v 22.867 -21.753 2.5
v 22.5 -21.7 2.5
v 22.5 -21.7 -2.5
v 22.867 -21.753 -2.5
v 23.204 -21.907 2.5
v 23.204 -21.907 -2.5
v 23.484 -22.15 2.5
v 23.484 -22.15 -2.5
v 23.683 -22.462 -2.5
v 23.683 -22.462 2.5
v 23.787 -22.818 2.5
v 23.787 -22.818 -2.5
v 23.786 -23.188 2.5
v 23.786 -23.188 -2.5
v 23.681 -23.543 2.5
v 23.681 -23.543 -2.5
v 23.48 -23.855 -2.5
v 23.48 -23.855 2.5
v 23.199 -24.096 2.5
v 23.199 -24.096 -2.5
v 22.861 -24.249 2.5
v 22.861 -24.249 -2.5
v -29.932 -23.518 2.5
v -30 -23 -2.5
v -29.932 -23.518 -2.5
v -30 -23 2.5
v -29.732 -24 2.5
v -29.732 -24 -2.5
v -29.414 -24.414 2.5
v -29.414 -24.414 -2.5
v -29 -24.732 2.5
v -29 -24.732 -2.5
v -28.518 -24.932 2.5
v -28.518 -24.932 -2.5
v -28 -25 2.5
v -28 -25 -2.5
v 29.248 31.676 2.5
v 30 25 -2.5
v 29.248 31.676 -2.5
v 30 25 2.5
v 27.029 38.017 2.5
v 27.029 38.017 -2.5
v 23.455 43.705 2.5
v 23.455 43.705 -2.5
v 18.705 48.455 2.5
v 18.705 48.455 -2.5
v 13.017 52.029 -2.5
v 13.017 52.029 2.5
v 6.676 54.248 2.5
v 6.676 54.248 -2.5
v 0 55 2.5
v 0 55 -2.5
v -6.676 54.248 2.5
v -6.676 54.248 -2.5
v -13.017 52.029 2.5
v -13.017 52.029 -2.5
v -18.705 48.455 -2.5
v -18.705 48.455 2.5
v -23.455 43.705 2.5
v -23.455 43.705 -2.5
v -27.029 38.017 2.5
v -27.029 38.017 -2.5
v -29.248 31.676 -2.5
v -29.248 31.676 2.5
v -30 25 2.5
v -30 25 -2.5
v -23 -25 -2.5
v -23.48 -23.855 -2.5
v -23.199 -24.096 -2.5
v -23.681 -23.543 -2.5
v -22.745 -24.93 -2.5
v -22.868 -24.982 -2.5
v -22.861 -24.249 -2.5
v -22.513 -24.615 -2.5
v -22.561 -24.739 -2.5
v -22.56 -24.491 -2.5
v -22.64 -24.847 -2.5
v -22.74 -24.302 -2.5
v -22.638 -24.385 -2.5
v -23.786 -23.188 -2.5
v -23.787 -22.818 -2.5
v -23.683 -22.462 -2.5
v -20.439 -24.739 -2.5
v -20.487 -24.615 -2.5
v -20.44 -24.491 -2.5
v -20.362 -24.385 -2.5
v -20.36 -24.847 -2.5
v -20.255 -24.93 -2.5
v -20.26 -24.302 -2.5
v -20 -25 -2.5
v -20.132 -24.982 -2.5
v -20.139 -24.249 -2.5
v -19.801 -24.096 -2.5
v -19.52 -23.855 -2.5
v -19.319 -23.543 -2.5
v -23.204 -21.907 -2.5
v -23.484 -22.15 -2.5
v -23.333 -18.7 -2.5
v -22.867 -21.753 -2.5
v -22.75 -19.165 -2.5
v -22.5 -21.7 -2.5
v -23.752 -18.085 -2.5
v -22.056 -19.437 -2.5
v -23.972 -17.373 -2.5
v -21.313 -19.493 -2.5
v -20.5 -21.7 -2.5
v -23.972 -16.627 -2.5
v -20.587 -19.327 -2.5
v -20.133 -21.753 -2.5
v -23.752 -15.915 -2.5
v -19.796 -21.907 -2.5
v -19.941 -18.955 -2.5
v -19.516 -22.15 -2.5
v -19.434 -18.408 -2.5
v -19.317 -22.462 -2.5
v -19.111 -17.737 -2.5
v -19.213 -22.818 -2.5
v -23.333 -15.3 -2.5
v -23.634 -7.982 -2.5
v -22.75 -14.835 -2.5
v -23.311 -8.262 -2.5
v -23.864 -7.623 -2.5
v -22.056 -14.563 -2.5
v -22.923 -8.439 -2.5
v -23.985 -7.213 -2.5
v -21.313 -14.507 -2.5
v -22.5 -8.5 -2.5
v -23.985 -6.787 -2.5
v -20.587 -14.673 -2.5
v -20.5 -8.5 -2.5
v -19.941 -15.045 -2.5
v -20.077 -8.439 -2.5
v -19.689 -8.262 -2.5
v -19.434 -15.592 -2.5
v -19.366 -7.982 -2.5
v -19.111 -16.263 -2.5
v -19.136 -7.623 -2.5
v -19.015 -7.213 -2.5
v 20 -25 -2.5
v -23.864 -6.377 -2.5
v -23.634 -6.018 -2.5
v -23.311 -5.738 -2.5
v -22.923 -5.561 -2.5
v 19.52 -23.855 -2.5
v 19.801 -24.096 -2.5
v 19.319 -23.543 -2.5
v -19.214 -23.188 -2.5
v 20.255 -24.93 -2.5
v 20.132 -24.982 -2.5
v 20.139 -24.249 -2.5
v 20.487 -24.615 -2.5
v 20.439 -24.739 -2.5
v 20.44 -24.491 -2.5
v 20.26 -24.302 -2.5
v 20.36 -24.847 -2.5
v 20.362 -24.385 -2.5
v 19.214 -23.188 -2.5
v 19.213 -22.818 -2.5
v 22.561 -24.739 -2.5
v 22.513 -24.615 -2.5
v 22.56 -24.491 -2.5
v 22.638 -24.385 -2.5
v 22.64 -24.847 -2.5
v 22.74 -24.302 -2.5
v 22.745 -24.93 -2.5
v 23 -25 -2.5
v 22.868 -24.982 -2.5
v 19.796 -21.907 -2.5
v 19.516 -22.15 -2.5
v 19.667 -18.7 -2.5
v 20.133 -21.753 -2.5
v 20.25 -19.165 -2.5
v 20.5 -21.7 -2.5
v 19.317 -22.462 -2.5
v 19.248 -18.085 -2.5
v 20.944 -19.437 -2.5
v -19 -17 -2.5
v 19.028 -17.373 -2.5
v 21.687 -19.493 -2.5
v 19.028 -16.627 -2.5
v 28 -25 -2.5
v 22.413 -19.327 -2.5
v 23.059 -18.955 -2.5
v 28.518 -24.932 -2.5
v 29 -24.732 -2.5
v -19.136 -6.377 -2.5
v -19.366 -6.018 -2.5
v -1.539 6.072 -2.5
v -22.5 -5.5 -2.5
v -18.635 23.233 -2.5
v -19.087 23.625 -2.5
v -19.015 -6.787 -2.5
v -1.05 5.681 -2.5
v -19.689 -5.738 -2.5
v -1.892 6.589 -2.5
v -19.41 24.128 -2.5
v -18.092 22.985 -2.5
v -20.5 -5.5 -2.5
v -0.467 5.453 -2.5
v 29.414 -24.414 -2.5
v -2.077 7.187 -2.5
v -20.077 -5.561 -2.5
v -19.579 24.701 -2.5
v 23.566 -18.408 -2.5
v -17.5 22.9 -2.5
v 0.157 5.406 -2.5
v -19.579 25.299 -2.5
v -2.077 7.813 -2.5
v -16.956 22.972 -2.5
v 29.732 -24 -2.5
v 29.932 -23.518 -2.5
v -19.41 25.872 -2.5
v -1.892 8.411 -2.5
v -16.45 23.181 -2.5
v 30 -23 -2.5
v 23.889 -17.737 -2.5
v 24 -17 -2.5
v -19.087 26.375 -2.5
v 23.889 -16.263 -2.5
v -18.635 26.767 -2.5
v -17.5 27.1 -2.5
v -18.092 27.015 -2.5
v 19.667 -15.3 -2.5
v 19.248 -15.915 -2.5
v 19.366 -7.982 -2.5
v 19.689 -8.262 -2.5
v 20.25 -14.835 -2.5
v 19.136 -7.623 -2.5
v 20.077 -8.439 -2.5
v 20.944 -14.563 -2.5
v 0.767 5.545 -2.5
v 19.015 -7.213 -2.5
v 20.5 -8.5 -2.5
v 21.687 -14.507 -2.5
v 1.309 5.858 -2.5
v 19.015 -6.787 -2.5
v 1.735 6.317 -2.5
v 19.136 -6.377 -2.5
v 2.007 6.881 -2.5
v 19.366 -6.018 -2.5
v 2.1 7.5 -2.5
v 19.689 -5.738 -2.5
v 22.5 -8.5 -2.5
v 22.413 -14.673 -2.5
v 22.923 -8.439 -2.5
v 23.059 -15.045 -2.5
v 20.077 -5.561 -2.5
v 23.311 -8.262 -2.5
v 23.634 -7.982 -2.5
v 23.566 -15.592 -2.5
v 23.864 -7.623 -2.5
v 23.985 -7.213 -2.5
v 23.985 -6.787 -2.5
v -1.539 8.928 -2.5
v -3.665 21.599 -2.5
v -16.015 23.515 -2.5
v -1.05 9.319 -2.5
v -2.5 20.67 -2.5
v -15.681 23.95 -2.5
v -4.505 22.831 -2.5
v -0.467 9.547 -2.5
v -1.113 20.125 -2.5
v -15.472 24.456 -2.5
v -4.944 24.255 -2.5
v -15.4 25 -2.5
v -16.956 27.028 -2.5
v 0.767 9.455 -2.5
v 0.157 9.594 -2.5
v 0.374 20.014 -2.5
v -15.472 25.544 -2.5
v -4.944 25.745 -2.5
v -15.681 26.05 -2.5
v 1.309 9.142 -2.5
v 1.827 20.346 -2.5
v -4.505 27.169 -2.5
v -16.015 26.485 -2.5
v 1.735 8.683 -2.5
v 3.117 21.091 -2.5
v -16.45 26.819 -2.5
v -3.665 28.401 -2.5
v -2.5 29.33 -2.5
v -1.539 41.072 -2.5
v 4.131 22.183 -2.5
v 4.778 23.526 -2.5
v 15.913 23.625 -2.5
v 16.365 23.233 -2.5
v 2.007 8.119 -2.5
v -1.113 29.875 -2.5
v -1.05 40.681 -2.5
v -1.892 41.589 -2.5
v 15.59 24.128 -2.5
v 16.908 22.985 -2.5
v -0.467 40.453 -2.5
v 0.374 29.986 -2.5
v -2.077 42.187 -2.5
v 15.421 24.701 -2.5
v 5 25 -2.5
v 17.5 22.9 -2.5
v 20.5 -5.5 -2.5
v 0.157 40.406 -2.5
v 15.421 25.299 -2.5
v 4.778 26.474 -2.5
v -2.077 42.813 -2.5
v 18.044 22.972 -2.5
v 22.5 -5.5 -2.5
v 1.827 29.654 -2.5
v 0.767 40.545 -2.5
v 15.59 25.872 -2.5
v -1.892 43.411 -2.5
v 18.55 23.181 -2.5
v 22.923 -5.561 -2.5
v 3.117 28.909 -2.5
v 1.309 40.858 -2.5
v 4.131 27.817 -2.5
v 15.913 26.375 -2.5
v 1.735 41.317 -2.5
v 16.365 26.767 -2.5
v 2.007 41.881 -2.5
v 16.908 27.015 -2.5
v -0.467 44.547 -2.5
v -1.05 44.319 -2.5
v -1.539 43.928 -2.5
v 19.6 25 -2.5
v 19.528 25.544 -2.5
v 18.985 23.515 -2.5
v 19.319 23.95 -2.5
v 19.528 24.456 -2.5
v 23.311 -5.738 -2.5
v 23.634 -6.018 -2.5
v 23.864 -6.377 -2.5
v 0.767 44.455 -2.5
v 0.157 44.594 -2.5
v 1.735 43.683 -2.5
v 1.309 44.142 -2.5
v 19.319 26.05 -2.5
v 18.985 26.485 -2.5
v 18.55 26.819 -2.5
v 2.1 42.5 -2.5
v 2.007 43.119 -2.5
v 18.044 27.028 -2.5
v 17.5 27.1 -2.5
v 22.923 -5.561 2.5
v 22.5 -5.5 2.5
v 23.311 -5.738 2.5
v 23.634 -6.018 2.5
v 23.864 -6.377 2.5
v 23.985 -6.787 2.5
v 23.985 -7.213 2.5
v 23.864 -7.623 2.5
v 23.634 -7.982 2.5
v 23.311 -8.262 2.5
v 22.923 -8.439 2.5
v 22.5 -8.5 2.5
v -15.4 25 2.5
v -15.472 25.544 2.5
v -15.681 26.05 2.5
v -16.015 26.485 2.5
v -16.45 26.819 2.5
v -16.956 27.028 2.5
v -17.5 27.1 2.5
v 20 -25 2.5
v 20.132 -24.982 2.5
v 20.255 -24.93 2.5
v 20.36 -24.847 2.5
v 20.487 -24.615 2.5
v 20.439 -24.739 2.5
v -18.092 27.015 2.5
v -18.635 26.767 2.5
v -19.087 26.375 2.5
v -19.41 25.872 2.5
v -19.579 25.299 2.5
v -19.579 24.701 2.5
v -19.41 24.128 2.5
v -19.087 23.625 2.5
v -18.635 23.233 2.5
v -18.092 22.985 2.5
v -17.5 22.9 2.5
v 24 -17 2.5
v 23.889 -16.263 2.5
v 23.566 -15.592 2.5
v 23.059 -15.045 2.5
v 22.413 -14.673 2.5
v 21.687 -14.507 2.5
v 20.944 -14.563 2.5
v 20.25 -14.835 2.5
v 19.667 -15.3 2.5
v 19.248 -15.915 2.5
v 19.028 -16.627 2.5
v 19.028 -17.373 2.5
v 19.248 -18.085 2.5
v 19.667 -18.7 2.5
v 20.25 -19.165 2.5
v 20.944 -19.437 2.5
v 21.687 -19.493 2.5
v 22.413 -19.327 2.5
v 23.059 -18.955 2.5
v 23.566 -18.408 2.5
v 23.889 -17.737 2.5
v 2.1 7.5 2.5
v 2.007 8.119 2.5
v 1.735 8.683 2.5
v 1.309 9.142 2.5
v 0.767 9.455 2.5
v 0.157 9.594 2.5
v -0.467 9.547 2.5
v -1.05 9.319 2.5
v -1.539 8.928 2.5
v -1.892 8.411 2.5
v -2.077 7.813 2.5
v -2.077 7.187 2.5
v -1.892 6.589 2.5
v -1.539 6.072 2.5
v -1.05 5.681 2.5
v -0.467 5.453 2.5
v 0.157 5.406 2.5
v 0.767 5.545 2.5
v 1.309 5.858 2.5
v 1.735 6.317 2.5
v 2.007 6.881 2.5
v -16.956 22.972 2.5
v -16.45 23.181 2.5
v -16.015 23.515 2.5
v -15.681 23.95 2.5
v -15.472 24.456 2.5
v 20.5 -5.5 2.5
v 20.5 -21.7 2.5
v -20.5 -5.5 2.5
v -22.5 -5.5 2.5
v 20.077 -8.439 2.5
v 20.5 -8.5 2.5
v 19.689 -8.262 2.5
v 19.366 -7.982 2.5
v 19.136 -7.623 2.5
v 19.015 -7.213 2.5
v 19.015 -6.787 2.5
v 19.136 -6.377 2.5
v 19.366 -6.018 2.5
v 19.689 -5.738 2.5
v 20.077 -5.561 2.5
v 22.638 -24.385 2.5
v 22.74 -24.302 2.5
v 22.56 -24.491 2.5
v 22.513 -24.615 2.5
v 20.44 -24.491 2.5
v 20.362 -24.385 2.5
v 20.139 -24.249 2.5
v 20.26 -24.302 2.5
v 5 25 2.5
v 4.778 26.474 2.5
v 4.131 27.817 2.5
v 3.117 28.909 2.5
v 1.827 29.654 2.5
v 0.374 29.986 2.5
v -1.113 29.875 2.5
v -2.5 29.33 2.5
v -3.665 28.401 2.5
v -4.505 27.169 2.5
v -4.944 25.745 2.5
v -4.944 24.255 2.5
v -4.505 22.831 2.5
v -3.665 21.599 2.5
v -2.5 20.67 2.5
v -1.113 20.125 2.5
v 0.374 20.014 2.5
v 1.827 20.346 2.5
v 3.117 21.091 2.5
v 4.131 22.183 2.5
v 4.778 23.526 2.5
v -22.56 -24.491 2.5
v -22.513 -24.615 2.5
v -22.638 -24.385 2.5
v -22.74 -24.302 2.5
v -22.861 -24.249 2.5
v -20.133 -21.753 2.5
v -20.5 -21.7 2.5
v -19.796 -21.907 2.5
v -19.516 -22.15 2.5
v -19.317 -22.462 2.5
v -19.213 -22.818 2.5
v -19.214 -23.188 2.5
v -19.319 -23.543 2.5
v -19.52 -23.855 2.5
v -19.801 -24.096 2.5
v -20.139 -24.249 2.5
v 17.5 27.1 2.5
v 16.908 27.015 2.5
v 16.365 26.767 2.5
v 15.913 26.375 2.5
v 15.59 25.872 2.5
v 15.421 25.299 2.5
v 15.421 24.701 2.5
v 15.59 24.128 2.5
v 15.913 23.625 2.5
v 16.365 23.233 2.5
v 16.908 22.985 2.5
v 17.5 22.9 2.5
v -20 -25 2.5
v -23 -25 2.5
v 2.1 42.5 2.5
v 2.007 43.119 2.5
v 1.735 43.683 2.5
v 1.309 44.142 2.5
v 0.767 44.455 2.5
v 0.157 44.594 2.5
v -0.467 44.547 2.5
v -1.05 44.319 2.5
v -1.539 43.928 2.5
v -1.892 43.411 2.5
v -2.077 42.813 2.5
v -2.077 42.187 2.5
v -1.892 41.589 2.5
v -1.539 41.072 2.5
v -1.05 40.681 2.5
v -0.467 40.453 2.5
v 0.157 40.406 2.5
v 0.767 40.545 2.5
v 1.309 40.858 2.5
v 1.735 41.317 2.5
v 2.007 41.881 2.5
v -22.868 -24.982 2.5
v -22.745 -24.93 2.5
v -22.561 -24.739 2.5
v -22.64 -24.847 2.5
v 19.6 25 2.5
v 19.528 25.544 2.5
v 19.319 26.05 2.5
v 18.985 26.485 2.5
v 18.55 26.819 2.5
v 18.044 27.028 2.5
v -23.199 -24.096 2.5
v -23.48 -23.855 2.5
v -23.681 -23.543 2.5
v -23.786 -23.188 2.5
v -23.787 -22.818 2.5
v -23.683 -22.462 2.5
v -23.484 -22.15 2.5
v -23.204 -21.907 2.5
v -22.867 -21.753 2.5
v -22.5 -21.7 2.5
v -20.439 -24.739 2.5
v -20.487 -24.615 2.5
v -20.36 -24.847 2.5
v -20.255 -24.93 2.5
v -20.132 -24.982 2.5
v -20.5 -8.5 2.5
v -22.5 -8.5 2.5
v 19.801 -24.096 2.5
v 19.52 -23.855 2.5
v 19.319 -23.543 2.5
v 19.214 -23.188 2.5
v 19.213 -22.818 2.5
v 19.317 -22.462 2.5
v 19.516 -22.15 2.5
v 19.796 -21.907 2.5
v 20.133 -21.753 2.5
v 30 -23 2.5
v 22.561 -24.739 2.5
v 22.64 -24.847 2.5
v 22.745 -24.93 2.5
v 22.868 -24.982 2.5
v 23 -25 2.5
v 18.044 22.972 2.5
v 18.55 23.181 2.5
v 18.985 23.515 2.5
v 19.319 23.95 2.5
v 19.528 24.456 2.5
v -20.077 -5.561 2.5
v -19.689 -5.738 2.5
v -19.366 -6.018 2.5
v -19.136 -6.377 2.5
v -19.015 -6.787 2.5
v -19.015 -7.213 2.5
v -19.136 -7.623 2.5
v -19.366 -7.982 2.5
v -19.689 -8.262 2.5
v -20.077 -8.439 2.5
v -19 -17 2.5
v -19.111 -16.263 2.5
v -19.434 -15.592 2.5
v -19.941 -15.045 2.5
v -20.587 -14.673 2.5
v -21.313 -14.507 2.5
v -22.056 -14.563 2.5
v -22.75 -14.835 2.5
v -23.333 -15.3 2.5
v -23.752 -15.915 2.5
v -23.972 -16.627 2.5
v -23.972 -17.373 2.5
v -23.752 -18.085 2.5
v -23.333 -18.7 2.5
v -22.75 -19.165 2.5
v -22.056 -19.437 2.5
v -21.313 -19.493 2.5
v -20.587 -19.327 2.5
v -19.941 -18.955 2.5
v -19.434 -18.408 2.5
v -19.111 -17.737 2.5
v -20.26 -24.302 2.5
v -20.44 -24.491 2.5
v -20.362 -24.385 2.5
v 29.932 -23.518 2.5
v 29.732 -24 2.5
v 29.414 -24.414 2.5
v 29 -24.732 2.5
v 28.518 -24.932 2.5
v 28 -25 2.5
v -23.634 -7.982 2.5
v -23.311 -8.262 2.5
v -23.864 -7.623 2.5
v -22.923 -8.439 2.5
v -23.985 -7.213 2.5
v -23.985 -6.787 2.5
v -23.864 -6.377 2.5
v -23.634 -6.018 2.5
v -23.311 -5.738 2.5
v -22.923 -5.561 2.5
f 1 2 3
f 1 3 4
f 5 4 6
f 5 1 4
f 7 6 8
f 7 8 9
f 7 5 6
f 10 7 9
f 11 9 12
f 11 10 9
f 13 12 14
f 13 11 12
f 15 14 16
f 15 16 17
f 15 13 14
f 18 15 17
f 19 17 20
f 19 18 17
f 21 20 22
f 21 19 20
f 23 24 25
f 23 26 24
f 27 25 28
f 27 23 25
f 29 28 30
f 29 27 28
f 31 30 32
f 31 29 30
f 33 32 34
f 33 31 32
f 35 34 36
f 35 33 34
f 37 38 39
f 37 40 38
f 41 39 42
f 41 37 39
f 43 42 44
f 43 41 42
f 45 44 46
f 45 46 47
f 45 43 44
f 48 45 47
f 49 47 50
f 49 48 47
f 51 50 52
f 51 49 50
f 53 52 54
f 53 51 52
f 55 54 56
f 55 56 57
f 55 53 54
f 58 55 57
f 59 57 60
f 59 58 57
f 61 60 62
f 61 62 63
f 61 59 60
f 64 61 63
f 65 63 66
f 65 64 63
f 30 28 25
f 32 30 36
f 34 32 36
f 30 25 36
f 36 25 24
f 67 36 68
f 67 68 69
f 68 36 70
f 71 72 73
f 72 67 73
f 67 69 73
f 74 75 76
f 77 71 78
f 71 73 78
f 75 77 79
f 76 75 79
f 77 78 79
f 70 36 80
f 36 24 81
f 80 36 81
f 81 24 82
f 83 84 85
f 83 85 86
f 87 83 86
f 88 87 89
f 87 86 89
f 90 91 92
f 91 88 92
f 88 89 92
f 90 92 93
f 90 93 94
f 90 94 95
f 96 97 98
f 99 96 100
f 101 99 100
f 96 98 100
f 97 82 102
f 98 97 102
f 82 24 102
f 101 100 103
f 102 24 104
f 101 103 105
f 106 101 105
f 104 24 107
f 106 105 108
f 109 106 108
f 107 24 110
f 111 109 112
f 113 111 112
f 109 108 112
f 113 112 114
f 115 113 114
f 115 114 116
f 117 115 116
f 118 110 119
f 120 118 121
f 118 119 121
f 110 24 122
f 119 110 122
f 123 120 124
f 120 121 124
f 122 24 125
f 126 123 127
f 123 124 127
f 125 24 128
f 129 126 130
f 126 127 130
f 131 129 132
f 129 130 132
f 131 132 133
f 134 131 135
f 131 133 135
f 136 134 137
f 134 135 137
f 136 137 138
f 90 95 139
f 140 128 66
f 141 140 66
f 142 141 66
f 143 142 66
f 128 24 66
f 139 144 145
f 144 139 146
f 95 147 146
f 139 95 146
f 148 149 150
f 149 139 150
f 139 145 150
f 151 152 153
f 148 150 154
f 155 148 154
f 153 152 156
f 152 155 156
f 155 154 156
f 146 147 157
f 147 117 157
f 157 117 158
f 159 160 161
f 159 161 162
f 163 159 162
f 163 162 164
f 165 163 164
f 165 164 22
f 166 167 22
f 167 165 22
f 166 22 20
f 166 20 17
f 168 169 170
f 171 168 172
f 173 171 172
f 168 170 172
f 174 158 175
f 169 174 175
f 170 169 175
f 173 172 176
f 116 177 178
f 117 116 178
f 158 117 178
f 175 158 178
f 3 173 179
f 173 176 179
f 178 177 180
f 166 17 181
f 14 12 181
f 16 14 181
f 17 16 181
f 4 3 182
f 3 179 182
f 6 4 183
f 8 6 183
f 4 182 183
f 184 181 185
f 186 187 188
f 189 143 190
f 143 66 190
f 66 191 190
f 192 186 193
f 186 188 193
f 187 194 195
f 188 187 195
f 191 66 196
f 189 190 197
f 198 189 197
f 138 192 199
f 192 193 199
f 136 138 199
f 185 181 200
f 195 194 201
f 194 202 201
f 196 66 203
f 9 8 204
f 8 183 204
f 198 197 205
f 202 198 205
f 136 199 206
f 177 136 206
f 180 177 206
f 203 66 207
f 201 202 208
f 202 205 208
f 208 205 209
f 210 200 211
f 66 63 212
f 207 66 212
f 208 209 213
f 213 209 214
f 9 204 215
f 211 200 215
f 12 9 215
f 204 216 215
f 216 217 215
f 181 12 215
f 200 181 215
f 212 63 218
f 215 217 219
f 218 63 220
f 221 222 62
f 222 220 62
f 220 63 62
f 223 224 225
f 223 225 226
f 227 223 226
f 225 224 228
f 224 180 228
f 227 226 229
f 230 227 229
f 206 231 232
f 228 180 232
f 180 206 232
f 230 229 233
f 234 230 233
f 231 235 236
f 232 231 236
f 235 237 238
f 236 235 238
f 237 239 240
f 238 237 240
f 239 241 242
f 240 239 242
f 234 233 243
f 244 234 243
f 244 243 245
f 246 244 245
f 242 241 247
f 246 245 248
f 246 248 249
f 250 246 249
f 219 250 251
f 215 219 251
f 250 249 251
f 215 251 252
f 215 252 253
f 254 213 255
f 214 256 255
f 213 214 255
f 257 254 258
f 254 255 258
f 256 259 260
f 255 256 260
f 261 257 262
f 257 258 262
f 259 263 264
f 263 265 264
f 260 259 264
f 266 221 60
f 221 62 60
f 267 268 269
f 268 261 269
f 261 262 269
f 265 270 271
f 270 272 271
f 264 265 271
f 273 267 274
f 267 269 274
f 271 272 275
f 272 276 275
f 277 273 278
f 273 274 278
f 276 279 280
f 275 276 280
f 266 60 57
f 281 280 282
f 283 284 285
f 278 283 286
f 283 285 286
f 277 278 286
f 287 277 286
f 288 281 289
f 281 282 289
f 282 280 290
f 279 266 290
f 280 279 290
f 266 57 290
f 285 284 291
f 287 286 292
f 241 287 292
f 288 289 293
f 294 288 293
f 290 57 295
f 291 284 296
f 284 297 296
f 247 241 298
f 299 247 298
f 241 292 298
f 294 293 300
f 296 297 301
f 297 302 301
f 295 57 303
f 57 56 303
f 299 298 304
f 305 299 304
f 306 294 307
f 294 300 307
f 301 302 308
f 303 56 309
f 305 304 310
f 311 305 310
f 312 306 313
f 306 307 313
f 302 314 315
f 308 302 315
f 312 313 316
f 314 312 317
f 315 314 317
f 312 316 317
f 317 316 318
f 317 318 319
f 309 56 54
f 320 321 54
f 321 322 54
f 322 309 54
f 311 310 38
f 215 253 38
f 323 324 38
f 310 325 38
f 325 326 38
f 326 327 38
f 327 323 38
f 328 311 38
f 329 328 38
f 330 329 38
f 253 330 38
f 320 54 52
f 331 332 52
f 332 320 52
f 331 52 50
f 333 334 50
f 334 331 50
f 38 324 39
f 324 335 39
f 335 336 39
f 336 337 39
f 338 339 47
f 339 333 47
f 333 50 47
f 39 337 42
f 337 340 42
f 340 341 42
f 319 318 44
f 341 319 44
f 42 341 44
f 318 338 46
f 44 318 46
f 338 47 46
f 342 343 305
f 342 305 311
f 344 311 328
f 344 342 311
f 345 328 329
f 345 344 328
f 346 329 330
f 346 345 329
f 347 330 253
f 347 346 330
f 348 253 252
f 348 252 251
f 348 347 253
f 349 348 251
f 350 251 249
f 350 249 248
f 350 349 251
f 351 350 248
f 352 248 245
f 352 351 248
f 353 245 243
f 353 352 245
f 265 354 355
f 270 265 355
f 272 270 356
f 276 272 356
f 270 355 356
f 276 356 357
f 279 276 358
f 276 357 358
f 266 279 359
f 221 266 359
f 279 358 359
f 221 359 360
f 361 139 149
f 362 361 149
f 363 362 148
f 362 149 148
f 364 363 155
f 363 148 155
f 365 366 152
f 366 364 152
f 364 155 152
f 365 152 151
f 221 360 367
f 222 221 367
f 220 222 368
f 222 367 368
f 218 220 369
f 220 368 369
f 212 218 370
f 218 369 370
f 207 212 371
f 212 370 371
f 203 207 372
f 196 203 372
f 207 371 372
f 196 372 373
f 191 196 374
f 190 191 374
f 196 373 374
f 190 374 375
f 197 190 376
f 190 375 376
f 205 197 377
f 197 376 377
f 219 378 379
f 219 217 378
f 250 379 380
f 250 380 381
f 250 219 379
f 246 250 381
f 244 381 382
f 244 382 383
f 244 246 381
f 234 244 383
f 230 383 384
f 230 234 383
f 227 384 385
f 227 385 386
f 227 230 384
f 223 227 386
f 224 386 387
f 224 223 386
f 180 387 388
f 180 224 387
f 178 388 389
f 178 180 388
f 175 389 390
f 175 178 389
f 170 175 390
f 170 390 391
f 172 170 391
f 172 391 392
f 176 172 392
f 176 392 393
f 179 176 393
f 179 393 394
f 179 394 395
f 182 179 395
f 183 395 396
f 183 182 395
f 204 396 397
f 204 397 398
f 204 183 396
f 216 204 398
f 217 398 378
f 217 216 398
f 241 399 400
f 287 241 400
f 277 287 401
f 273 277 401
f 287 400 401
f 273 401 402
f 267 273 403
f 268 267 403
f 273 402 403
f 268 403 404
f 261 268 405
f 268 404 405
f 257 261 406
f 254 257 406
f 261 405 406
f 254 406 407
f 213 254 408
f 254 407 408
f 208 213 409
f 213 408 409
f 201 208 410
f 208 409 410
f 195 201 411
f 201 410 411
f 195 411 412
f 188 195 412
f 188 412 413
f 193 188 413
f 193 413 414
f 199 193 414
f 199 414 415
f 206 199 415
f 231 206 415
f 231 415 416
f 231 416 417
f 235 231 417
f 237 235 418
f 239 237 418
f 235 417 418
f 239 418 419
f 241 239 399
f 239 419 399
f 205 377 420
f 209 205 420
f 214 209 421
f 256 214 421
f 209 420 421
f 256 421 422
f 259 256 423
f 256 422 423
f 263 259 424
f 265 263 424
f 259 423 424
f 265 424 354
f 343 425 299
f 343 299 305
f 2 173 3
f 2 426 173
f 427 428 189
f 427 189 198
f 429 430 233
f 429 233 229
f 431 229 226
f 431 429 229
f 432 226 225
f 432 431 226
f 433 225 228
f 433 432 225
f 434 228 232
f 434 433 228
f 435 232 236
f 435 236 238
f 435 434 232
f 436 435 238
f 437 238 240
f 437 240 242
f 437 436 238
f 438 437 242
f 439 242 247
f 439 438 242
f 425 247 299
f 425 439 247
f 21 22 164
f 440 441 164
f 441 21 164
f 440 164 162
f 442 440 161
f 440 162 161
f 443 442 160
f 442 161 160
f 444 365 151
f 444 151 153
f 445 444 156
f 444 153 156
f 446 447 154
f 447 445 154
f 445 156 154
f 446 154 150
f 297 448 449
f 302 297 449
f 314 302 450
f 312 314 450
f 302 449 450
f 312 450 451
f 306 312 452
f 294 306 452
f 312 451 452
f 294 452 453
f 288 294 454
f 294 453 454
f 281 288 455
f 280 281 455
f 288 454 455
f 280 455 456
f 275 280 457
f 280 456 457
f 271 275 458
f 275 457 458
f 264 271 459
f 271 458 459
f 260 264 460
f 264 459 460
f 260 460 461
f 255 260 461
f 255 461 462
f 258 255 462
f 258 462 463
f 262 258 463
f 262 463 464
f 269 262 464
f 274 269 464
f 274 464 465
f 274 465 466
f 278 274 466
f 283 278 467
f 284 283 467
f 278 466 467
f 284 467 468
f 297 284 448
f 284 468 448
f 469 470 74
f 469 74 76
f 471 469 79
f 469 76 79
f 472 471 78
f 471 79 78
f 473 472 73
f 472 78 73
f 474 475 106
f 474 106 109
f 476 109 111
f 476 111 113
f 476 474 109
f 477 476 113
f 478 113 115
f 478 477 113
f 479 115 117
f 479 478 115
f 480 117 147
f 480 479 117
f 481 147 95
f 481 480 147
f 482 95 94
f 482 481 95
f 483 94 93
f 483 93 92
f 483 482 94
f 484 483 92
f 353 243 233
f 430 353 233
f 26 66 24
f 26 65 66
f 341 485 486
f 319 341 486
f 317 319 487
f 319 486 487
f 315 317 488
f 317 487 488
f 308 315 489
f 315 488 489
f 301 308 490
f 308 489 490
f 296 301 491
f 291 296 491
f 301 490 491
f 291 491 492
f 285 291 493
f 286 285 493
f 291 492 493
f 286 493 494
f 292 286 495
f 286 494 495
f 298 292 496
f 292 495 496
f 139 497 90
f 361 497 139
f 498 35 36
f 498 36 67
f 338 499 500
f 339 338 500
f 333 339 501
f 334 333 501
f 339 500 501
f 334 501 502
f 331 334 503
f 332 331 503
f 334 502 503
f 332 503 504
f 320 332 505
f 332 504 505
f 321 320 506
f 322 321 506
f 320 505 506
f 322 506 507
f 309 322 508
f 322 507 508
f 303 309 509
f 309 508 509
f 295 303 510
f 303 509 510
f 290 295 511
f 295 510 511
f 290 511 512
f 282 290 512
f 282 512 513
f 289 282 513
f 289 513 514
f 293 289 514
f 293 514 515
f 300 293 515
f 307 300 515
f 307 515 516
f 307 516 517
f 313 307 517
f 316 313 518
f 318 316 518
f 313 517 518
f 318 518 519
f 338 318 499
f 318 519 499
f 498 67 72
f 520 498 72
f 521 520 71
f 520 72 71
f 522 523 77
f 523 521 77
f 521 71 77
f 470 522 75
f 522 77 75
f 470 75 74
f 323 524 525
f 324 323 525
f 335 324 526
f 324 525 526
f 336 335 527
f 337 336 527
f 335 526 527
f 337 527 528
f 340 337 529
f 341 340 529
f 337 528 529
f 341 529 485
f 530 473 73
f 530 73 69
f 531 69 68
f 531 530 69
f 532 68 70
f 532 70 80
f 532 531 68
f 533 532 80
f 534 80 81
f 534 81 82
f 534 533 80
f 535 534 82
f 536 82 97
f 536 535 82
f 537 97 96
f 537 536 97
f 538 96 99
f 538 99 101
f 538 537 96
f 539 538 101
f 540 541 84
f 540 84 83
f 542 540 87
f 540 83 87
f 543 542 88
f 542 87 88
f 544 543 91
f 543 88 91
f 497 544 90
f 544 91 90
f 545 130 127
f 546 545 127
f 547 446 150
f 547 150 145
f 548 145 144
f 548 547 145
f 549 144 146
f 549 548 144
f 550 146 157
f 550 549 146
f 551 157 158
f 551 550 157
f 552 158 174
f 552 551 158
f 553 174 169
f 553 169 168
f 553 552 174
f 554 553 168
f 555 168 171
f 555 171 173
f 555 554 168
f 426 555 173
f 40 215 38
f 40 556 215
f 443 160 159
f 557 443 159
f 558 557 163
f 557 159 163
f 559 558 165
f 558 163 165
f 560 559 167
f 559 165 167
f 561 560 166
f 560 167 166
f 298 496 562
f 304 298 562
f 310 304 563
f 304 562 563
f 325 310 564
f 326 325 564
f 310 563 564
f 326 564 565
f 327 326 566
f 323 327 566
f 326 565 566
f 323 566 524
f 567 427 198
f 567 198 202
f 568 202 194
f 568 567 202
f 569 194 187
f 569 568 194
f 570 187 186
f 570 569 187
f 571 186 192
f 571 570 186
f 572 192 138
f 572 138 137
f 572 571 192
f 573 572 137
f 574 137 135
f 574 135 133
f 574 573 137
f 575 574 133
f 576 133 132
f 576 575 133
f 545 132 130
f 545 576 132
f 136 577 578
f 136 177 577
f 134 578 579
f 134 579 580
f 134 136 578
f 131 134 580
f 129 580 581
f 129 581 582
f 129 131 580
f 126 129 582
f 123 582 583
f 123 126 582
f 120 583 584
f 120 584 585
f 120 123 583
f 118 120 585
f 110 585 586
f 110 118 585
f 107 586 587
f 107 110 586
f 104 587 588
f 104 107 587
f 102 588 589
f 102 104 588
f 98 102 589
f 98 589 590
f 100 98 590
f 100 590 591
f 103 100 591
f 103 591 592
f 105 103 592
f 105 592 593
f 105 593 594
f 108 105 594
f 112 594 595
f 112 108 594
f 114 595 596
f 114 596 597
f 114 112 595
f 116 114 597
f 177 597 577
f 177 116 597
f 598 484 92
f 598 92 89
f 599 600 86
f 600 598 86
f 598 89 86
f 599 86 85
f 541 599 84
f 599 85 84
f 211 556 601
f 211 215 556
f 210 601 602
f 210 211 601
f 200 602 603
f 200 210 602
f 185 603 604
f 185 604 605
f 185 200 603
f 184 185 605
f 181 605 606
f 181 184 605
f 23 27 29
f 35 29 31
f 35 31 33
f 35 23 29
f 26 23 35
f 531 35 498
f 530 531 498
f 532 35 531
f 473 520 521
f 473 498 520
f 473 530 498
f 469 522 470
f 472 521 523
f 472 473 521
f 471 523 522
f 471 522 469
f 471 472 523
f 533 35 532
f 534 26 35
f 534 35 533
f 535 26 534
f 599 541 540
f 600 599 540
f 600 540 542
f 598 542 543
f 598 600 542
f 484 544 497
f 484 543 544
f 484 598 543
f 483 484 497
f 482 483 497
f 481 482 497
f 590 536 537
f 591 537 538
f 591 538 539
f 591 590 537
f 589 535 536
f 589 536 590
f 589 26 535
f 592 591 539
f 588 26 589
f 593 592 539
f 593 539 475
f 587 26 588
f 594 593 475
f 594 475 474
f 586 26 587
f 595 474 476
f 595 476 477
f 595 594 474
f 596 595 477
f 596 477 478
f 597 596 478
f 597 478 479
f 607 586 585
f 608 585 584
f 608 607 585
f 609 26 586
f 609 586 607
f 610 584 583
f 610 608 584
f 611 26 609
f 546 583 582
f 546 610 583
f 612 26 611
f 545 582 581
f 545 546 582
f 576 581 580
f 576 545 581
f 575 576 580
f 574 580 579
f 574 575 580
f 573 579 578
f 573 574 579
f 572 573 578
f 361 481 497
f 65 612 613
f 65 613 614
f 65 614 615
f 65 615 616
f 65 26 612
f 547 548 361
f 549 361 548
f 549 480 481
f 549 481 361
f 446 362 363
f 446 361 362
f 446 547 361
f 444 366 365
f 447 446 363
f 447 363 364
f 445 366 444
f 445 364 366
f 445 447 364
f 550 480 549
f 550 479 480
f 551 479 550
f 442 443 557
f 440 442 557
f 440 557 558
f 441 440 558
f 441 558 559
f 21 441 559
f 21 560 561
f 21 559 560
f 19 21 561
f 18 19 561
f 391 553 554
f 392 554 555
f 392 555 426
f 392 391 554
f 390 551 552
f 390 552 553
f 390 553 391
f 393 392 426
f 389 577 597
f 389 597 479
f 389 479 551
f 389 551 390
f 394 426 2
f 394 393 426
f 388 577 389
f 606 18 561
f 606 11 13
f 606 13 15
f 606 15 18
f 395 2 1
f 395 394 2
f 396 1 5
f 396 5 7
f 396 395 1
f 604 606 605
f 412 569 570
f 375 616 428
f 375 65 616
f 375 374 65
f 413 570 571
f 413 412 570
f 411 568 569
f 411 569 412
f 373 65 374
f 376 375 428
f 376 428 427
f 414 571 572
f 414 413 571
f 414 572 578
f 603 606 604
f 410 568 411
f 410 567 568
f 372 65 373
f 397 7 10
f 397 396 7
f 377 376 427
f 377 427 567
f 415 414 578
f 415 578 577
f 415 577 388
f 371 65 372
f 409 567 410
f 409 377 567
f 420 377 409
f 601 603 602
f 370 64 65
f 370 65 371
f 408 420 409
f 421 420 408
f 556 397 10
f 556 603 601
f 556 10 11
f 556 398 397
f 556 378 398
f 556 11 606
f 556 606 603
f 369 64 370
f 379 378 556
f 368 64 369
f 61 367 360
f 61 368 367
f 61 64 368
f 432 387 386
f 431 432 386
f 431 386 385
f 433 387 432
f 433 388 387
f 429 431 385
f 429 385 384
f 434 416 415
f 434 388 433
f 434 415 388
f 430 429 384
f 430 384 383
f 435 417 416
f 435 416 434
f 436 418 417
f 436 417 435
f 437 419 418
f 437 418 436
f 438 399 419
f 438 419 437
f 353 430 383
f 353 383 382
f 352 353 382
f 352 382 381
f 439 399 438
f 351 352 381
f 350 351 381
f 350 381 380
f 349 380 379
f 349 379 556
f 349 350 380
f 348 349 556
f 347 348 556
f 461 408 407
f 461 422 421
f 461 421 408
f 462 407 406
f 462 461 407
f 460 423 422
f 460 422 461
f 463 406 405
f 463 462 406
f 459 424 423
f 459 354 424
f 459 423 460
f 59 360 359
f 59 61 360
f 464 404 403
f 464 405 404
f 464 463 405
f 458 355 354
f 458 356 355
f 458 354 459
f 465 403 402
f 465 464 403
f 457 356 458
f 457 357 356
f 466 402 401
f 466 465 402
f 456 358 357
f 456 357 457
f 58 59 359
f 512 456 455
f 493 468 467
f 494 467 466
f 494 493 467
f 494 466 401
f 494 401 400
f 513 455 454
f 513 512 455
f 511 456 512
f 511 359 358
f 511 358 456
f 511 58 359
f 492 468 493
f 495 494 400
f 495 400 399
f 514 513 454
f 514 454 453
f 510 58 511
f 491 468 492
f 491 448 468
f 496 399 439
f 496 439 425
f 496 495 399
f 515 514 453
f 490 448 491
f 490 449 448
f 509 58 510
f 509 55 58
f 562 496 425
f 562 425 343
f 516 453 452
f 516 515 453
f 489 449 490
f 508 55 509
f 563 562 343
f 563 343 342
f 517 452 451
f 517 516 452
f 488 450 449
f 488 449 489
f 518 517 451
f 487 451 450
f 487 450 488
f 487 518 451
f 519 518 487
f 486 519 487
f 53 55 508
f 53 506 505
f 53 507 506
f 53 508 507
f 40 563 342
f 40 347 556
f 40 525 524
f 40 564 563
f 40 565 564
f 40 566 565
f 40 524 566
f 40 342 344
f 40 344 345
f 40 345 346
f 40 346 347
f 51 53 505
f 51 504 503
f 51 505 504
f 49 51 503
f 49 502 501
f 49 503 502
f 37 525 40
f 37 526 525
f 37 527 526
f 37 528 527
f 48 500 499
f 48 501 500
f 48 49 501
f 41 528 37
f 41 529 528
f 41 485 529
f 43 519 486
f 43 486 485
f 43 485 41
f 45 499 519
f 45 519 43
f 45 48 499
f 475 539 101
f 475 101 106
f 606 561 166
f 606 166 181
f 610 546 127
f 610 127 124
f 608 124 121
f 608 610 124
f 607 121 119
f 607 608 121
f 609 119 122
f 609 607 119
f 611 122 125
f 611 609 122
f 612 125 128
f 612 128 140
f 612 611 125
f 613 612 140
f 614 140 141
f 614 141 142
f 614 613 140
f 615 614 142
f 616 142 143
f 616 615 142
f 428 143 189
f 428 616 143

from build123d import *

# Parameters (mm, degrees)
SKETCH1_R           = 2.5
BOSS_EXTRUDE1_DEPTH = 2.5
SKETCH2_R           = 5
CUT_EXTRUDE1_DEPTH  = 5
FILLET1_R           = 0.5
FILLET2_R           = 2


with BuildPart() as part:
    # Sketch1 → Boss-Extrude1 (new, symmetric)
    # profile 1 of 2: a face of its own
    with BuildSketch(Plane.XY):
        with BuildLine():
            Line((-30, 25), (-30, -25))
            Line((-30, -25), (-22.5, -25))
            Line((-22.5, -25), (-22.5, -24.3))
            ThreePointArc((-22.5, -24.3), (-23.8, -23), (-22.5, -21.7))
            Line((-22.5, -21.7), (-20.5, -21.7))
            ThreePointArc((-20.5, -21.7), (-19.2, -23), (-20.5, -24.3))
            Line((-20.5, -24.3), (-20.5, -25))
            Line((-20.5, -25), (20.5, -25))
            Line((20.5, -25), (20.5, -24.3))
            ThreePointArc((20.5, -24.3), (19.2, -23), (20.5, -21.7))
            Line((20.5, -21.7), (22.5, -21.7))
            ThreePointArc((22.5, -21.7), (23.8, -23), (22.5, -24.3))
            Line((22.5, -24.3), (22.5, -25))
            Line((22.5, -25), (30, -25))
            Line((30, -25), (30, 25))
            Line((30, 25), (-30, 25))
        make_face()
        with Locations((-21.5, -17)):
            Circle(SKETCH1_R, mode=Mode.SUBTRACT)
        with BuildLine():
            Line((-22.5, -5.5), (-20.5, -5.5))
            ThreePointArc((-20.5, -5.5), (-19, -7), (-20.5, -8.5))
            Line((-20.5, -8.5), (-22.5, -8.5))
            ThreePointArc((-22.5, -8.5), (-24, -7), (-22.5, -5.5))
        make_face(mode=Mode.SUBTRACT)
        with Locations((21.5, -17)):
            Circle(SKETCH1_R, mode=Mode.SUBTRACT)
        with BuildLine():
            ThreePointArc((20.5, -8.5), (19, -7), (20.5, -5.5))
            Line((20.5, -5.5), (22.5, -5.5))
            ThreePointArc((22.5, -5.5), (24, -7), (22.5, -8.5))
            Line((22.5, -8.5), (20.5, -8.5))
        make_face(mode=Mode.SUBTRACT)
    # profile 2 of 2: a face of its own
    with BuildSketch(Plane.XY):
        with BuildLine():
            ThreePointArc((30, 25), (0, 55), (-30, 25))
            Line((-30, 25), (30, 25))
        make_face()
    extrude(amount=BOSS_EXTRUDE1_DEPTH, both=True)

    # Sketch2 → Cut-Extrude1 (cut)
    with BuildSketch(Plane.XY.offset(2.5)):
        with Locations((0, 25)):
            Circle(SKETCH2_R)
        with BuildLine():
            ThreePointArc((-17.5, 27.1), (-19.6, 25), (-17.5, 22.9))
            Line((-17.5, 22.9), (-17.5, 27.1))
        make_face()
        with BuildLine():
            Line((-17.5, 27.1), (-17.5, 22.9))
            ThreePointArc((-17.5, 22.9), (-16.01507576, 23.51507576), (-15.4, 25))
            ThreePointArc((-15.4, 25), (-16.01507576, 26.48492424), (-17.5, 27.1))
        make_face()
        with BuildLine():
            ThreePointArc((17.5, 27.1), (15.4, 25), (17.5, 22.9))
            Line((17.5, 22.9), (17.5, 27.1))
        make_face()
        with BuildLine():
            Line((17.5, 27.1), (17.5, 22.9))
            ThreePointArc((17.5, 22.9), (18.98492424, 23.51507576), (19.6, 25))
            ThreePointArc((19.6, 25), (18.98492424, 26.48492424), (17.5, 27.1))
        make_face()
        with BuildLine():
            ThreePointArc((-2.1, 42.5), (0, 40.4), (2.1, 42.5))
            Line((2.1, 42.5), (-2.1, 42.5))
        make_face()
        with BuildLine():
            Line((-2.1, 42.5), (2.1, 42.5))
            ThreePointArc((2.1, 42.5), (0, 44.6), (-2.1, 42.5))
        make_face()
        with BuildLine():
            ThreePointArc((-2.1, 7.5), (0, 5.4), (2.1, 7.5))
            Line((2.1, 7.5), (-2.1, 7.5))
        make_face()
        with BuildLine():
            Line((-2.1, 7.5), (2.1, 7.5))
            ThreePointArc((2.1, 7.5), (0, 9.6), (-2.1, 7.5))
        make_face()
    extrude(amount=-CUT_EXTRUDE1_DEPTH, mode=Mode.SUBTRACT)

    # Fillet1
    # the kernel refuses this fillet: 0.5 mm, written as the material it takes off along each edge
    with BuildSketch(Plane(origin=(22.5, -25, -3.75), x_dir=(1, 0, 0), z_dir=(0, 0, 1))) as fillet1_piece_1:
        with BuildLine():
            CenterArc((FILLET1_R, FILLET1_R), FILLET1_R, 180, 90)
            Line((0, FILLET1_R), (0, 0))
            Line((0, 0), (FILLET1_R, 0))
        make_face()
    extrude(amount=7.5, mode=Mode.SUBTRACT)
    with BuildSketch(Plane(origin=(20.5, -25, -3.75), x_dir=(-1, 0, 0), z_dir=(0, 0, 1)), Plane(origin=(-20.5, -25, -3.75), x_dir=(0, 1, 0), z_dir=(0, 0, 1)), Plane(origin=(-22.5, -25, -3.75), x_dir=(-1, 0, 0), z_dir=(0, 0, 1))) as fillet1_piece_2:
        with BuildLine():
            CenterArc((FILLET1_R, -FILLET1_R), FILLET1_R, 90, 90)
            Line((0, -FILLET1_R), (0, 0))
            Line((0, 0), (FILLET1_R, 0))
        make_face()
    extrude(amount=7.5, mode=Mode.SUBTRACT)
    with BuildSketch(Plane(origin=(22.5, -24.3, -3.572904116), x_dir=(0, -1, 0), z_dir=(0, 0, 1))) as fillet1_piece_3:
        with BuildLine():
            CenterArc((0.429161647, 0.5), FILLET1_R, 196.127620213, 73.872379787)
            ThreePointArc((-0.051161033, 0.361111111), (-0.012853805, 0.182358634), (0, 0))
            Line((0, 0), (0.429161647, 0))
        make_face()
    extrude(amount=7.145808233, mode=Mode.SUBTRACT)
    with BuildSketch(Plane(origin=(20.5, -24.3, -3.572904116), x_dir=(-0.9901124580598394, 0.1402758724610287, 0), z_dir=(0, 0, 1))) as fillet1_piece_4:
        with BuildLine():
            CenterArc((0.434855205, 0.495056229), FILLET1_R, 188.063810107, 73.872379787)
            Line((-0.060201024, 0.424918293), (0, 0))
            ThreePointArc((0, 0), (0.182358634, 0.012853805), (0.364717268, 0))
        make_face()
    extrude(amount=7.145808233, mode=Mode.SUBTRACT)
    with BuildSketch(Plane(origin=(-20.5, -24.3, -3.572904116), x_dir=(0.9901124580598384, 0.14027587246103554, 0), z_dir=(0, 0, 1))) as fillet1_piece_5:
        with BuildLine():
            CenterArc((0.434855205, -0.495056229), FILLET1_R, 98.063810107, 73.872379787)
            Line((-0.060201024, -0.424918293), (0, 0))
            ThreePointArc((0, 0), (0.182358634, -0.012853805), (0.364717268, 0))
        make_face()
    extrude(amount=7.145808233, mode=Mode.SUBTRACT)
    with BuildSketch(Plane(origin=(-22.5, -24.3, -3.572904116), x_dir=(0, -1, 0), z_dir=(0, 0, 1))) as fillet1_piece_6:
        with BuildLine():
            CenterArc((0.429161647, -0.5), FILLET1_R, 90, 73.872379787)
            ThreePointArc((-0.051161033, -0.361111111), (-0.012853805, -0.182358634), (0, 0))
            Line((0, 0), (0.429161647, 0))
        make_face()
    extrude(amount=7.145808233, mode=Mode.SUBTRACT)

    # Fillet2
    fillet2_edges = [part.edges().sort_by_distance(p)[0] for p in [
        (-30, -25, 0),
        (30, -25, 0),
    ]]
    fillet(fillet2_edges, radius=FILLET2_R)


solid = part.part
